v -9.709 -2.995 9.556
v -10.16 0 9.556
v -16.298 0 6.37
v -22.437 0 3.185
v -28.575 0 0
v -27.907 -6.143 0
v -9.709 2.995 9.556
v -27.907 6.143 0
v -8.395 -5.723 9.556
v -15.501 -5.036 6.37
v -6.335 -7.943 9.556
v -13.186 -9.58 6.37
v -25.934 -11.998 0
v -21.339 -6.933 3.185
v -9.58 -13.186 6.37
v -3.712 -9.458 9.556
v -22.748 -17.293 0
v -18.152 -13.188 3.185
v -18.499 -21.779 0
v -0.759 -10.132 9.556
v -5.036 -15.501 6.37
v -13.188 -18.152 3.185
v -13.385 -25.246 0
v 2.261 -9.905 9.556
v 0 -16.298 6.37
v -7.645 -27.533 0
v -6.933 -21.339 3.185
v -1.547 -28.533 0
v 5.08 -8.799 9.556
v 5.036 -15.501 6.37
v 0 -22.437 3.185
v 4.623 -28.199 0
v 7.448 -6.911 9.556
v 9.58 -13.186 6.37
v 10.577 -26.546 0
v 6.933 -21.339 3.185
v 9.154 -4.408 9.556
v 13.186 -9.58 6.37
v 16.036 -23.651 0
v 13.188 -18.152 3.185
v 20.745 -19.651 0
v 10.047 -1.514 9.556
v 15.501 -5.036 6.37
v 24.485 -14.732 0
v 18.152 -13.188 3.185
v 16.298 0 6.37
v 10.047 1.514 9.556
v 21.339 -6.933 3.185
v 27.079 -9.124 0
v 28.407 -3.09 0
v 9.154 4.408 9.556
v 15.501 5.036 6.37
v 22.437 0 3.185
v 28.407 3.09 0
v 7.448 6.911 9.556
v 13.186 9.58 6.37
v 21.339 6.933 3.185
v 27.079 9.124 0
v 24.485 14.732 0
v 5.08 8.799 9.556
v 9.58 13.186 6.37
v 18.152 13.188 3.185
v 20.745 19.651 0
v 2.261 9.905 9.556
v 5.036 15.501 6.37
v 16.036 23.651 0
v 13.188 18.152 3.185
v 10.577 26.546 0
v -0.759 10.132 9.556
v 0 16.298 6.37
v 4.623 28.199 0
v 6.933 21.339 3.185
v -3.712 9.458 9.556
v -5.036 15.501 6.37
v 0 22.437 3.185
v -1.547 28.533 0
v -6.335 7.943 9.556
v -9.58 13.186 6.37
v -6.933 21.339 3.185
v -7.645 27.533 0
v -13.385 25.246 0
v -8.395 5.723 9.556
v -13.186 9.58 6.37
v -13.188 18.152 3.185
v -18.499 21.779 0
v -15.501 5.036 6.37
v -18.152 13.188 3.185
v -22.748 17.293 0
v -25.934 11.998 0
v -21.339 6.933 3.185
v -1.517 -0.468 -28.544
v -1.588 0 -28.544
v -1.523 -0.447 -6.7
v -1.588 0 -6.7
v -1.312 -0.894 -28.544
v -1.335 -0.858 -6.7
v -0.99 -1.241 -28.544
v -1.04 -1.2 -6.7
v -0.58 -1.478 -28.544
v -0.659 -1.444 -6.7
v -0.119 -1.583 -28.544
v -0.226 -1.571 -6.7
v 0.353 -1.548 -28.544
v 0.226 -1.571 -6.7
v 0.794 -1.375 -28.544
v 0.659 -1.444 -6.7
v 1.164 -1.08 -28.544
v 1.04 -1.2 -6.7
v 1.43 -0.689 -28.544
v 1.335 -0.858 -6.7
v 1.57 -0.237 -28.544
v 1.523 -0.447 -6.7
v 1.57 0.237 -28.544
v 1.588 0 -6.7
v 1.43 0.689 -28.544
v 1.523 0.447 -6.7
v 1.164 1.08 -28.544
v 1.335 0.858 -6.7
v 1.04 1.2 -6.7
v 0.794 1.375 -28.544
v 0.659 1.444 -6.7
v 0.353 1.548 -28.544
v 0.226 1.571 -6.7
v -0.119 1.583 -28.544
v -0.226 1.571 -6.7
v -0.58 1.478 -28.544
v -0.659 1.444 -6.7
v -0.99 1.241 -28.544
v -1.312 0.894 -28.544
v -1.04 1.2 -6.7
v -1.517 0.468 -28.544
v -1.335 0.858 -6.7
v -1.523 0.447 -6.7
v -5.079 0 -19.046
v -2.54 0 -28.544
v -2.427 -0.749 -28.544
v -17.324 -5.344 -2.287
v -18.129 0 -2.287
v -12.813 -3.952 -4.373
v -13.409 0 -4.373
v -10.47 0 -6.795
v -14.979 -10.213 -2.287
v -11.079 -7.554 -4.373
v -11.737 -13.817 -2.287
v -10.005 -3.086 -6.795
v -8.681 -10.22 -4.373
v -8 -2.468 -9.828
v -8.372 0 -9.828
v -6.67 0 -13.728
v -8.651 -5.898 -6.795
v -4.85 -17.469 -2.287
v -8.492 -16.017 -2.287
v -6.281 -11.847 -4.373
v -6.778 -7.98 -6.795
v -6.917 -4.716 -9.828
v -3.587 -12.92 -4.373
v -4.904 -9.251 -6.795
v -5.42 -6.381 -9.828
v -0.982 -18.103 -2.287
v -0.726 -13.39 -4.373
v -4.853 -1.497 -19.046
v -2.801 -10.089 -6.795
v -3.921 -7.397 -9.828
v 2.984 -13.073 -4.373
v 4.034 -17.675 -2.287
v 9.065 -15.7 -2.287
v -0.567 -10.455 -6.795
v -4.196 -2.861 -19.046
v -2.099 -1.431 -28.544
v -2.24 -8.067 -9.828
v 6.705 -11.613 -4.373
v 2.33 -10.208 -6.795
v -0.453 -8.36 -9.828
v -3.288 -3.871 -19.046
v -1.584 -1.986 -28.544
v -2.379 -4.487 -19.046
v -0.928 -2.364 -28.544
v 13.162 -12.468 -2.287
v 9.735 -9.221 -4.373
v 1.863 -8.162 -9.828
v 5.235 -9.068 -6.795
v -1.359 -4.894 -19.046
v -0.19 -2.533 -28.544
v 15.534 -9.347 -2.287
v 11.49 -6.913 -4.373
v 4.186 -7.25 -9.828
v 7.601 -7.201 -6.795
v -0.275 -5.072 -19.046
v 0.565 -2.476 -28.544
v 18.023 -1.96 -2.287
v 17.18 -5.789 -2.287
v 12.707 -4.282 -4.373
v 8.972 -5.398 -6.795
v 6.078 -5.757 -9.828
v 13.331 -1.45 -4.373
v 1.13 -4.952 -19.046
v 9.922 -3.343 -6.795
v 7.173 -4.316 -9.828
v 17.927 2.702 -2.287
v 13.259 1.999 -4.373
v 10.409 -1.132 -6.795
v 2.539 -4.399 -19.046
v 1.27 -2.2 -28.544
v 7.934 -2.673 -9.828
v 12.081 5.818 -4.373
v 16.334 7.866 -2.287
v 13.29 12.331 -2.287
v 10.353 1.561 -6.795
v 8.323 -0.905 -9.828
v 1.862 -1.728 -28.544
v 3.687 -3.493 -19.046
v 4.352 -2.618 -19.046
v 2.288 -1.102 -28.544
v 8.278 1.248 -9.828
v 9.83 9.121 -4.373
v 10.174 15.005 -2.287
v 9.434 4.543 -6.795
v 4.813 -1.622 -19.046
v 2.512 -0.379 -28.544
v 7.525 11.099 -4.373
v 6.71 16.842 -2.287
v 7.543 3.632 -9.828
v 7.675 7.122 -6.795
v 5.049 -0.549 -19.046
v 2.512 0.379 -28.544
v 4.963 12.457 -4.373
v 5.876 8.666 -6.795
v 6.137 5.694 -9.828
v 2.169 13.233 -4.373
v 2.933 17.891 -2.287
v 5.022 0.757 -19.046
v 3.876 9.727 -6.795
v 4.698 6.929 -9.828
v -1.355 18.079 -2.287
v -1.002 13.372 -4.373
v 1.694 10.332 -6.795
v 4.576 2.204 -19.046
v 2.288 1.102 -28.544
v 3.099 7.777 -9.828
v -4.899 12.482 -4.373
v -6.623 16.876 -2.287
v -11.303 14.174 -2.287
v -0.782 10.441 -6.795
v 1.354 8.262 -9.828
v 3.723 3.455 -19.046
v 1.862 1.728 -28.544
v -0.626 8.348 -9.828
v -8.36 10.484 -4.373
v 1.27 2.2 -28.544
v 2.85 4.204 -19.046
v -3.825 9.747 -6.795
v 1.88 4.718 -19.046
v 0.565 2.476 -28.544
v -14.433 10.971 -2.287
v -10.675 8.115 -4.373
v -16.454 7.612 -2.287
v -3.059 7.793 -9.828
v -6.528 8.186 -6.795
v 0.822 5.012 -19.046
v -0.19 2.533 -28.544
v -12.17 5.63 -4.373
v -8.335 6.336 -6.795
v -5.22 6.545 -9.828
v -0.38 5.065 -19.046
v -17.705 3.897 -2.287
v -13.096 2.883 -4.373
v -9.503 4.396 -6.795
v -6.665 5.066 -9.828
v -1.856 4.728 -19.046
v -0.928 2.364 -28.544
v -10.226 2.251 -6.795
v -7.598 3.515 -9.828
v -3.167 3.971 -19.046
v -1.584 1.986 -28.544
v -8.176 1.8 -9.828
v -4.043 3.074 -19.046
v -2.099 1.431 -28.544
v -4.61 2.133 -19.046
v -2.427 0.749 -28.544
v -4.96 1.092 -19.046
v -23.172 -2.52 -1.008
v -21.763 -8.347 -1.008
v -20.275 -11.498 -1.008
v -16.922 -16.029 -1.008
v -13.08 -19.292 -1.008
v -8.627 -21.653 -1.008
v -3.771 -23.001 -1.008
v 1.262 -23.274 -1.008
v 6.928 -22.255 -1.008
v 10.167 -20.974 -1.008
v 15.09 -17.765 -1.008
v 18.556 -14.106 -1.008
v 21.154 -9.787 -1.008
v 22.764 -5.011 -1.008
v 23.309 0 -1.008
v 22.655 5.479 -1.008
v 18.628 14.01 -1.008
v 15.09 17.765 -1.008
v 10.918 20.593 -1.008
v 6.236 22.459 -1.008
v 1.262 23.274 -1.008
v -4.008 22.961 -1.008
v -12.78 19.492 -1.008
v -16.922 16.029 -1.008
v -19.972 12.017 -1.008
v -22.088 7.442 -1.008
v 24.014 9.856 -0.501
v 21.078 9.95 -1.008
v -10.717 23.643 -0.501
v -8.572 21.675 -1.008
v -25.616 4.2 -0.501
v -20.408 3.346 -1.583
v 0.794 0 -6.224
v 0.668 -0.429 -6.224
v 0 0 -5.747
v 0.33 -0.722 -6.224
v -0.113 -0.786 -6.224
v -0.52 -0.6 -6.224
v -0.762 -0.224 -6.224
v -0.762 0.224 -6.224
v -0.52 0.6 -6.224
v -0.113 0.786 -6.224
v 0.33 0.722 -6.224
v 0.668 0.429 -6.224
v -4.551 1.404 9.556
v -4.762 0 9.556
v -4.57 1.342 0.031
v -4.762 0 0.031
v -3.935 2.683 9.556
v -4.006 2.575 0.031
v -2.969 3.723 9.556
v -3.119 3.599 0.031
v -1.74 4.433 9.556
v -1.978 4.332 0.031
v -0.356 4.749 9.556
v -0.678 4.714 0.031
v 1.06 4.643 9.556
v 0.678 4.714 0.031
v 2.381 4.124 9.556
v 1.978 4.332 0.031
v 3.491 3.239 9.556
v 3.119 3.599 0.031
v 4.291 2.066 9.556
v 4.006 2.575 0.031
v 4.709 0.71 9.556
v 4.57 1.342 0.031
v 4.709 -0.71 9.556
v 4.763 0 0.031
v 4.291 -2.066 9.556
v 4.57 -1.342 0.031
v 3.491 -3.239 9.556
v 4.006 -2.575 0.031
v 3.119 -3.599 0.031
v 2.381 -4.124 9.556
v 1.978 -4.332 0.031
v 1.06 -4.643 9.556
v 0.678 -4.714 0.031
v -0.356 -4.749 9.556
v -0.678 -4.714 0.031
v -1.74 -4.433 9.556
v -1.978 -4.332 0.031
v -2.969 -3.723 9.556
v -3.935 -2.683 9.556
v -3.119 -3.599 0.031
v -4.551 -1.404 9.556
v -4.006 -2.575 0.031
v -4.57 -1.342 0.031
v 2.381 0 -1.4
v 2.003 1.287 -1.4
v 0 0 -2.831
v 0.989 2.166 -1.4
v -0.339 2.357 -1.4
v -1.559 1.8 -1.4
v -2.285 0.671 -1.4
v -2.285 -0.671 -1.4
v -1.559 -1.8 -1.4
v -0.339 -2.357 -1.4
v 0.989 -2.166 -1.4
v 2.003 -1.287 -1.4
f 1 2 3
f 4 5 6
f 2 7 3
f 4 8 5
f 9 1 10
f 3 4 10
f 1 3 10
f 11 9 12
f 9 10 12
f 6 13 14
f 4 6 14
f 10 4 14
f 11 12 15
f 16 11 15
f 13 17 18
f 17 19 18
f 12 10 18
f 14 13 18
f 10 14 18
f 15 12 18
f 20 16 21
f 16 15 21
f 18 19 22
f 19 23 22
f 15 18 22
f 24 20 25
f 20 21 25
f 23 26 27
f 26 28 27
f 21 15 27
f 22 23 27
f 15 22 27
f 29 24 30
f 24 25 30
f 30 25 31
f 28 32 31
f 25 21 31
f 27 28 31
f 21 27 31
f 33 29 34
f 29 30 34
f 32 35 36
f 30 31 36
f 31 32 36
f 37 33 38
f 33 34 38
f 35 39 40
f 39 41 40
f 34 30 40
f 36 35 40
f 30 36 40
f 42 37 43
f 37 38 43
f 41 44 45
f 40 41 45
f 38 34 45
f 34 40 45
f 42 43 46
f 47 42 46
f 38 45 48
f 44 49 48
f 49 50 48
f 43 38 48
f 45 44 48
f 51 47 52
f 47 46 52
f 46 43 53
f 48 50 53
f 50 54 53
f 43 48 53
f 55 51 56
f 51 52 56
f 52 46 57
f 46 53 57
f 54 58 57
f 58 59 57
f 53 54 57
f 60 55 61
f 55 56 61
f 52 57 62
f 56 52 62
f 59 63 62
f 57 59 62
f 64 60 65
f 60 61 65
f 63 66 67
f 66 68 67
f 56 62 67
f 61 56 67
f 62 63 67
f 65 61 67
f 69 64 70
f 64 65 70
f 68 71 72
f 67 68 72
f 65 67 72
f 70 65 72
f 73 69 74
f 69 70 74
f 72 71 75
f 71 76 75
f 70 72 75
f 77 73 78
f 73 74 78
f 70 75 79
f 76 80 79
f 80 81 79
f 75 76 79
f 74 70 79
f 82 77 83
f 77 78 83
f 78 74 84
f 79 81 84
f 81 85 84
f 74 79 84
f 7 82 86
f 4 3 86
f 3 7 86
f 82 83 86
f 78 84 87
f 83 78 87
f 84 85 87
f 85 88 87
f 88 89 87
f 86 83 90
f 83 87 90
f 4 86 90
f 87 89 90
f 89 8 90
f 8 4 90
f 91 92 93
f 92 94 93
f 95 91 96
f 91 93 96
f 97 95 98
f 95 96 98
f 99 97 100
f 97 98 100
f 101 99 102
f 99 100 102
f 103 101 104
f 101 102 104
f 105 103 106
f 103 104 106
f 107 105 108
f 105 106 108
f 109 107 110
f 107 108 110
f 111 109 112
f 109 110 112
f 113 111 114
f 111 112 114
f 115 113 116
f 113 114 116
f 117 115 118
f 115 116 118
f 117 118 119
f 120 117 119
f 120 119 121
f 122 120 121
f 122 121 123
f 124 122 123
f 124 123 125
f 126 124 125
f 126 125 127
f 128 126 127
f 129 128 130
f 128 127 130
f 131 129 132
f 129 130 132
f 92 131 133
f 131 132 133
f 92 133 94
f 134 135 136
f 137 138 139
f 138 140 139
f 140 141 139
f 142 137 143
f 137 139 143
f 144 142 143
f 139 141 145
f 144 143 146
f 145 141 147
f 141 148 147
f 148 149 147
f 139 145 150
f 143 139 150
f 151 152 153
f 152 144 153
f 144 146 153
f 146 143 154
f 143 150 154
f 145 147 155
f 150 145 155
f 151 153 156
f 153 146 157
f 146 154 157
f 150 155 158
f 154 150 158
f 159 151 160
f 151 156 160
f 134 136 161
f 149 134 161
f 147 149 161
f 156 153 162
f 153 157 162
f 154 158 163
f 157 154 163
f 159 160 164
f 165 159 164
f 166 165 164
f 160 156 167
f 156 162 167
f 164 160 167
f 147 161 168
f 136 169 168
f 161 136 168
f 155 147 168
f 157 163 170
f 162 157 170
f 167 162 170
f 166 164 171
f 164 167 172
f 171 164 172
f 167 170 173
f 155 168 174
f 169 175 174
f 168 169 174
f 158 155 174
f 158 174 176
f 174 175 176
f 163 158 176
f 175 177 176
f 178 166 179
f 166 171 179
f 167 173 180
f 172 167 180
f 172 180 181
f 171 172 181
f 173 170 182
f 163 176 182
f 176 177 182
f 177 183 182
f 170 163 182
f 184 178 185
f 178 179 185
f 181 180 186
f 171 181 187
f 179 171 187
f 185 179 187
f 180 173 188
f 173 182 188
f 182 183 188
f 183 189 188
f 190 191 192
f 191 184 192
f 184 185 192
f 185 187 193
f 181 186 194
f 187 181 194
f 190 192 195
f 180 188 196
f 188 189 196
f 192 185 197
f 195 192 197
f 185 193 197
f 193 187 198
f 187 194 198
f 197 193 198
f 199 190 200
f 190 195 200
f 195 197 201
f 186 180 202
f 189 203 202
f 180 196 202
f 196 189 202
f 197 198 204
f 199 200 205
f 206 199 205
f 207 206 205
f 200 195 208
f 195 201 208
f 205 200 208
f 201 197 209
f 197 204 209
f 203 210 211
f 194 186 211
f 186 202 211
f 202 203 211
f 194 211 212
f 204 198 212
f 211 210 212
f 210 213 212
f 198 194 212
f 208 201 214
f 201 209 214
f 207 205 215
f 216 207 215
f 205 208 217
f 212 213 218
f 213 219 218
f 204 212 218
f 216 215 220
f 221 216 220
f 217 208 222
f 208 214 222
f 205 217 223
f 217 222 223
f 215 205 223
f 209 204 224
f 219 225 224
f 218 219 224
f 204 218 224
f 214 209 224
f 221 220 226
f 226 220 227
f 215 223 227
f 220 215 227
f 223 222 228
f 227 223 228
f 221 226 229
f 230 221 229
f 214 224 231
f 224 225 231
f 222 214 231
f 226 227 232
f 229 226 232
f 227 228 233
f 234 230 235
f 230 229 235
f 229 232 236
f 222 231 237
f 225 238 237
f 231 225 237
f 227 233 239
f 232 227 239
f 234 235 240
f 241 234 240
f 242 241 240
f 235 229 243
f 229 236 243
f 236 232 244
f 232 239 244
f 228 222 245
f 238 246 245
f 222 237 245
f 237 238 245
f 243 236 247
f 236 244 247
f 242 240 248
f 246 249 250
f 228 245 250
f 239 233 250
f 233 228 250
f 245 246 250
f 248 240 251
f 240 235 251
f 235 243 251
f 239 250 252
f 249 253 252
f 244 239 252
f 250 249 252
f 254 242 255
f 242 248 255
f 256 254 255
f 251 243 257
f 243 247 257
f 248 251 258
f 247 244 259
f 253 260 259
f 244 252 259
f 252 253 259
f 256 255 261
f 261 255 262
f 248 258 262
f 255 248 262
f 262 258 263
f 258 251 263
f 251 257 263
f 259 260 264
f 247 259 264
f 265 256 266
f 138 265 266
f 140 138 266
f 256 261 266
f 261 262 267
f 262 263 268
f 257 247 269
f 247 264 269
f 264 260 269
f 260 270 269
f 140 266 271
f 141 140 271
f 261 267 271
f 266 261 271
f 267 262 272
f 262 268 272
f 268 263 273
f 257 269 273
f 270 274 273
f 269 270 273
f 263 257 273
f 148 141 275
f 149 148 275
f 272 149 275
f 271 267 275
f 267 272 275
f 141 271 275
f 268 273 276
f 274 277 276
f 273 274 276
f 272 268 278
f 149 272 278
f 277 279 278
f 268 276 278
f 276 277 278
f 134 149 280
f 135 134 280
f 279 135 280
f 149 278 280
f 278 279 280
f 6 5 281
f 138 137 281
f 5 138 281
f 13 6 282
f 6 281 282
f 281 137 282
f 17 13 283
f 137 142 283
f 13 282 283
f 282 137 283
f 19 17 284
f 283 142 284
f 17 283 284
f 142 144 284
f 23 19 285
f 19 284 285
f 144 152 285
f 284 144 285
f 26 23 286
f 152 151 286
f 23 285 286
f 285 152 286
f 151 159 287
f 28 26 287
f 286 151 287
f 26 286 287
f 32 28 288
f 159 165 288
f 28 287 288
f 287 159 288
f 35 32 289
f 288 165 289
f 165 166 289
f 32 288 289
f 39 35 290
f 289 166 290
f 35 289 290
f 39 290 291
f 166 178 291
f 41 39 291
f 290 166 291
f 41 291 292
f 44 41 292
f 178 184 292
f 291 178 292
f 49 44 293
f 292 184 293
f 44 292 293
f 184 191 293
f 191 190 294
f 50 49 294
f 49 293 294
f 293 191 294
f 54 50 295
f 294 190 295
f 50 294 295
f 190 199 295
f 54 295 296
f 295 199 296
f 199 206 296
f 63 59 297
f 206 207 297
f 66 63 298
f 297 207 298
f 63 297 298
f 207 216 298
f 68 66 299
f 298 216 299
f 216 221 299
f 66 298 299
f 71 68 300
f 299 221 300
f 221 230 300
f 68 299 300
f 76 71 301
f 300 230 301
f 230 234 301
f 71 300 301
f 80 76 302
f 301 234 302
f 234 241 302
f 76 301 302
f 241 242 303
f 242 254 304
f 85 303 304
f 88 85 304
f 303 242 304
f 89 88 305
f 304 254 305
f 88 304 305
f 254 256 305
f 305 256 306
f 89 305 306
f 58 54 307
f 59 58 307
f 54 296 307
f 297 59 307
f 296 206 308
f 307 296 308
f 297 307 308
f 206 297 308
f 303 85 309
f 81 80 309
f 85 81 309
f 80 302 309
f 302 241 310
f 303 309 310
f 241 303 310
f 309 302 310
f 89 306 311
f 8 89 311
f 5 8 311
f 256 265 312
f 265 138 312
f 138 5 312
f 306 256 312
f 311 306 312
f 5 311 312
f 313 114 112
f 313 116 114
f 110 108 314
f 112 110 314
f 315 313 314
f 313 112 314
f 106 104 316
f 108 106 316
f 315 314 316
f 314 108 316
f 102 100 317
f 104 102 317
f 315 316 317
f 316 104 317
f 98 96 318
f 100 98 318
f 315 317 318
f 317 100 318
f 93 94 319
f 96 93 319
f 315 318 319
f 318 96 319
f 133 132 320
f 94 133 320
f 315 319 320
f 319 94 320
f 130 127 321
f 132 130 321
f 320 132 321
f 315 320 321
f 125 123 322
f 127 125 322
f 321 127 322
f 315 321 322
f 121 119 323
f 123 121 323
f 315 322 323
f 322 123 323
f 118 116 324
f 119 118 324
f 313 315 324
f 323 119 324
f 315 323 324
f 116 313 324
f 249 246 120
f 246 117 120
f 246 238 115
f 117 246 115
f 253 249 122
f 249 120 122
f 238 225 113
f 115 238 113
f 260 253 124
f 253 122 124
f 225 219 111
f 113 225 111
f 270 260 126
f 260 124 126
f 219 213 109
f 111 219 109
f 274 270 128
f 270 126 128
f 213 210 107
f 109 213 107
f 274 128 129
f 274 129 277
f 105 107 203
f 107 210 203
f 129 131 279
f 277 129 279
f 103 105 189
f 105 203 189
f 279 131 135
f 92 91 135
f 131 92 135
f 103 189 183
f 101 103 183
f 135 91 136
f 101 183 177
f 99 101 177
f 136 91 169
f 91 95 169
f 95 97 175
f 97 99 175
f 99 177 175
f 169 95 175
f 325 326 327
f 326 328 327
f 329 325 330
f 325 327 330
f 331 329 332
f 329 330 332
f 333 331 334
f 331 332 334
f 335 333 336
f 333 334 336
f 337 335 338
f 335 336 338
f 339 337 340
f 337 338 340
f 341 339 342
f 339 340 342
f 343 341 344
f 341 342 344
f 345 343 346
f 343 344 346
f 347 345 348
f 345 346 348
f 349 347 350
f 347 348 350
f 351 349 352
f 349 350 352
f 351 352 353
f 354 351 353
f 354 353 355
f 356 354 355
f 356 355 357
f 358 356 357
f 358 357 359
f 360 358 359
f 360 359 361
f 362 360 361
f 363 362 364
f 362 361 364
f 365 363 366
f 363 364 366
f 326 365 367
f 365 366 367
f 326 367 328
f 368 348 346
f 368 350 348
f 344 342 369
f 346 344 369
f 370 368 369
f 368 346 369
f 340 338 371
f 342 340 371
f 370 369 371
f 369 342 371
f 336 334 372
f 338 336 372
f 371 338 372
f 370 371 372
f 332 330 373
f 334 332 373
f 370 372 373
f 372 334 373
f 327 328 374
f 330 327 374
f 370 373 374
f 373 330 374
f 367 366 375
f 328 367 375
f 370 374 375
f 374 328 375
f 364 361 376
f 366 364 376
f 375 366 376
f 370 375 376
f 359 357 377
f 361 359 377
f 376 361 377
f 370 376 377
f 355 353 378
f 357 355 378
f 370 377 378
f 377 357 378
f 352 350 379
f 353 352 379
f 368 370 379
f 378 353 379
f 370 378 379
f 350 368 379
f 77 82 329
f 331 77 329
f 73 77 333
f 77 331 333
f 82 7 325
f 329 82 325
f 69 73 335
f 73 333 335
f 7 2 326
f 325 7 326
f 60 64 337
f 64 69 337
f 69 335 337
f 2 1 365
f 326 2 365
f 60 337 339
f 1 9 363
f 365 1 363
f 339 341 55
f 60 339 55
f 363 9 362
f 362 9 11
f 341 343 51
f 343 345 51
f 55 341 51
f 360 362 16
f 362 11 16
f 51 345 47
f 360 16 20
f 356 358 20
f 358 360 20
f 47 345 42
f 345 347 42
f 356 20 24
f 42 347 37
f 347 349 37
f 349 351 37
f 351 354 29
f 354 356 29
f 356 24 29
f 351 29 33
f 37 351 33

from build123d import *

# Parameters (mm, degrees)
F3_D     = 9.525
F3_DEPTH = 9.525
F3_TIP   = 2.8615986981
F5_D     = 3.175
F5_DEPTH = 21.844
F5_TIP   = 0.9538662327


with BuildPart() as f1:
    # F0 (on Front) → F1 (revolve)
    with BuildSketch(Plane.XZ):
        with BuildLine():
            Line((-2.54, -28.544438532), (0, -28.544438532))
            Line((0, -28.544438532), (0, 0))
            Line((0, 0), (-28.575, 0))
            add(Edge.make_bspline(
                [(-28.575, 0), (-22.1033814669, -1.3008907493), (-6.7932074564, -2.9181800603), (-4.8525862527, -21.5668183457), (-2.54, -28.544438532)],
                knots=[0, 0, 0, 0, 0.476190706, 1, 1, 1, 1], degree=3))
        make_face()
        Polygon((-28.575, 0), (0, 0), (0, 9.555561468), (-10.16, 9.555561468), align=None)
    revolve(axis=Axis((0, 0, -9.494438532), (0, 0, 1)))

    # F3
    with Locations(Plane.XY.offset(9.555561468)):
        with Locations((0, 0)):
            Hole(F3_D / 2, depth=F3_DEPTH)
            with Locations((0, 0, -(F3_DEPTH + F3_TIP / 2))):  # 118° drill point
                Cone(0, F3_D / 2, F3_TIP, mode=Mode.SUBTRACT)

    # F5
    with Locations(Plane(origin=(0, 0, -28.544438532), x_dir=(1, 0, 0), z_dir=(0, 0, -1))):
        with Locations((0, 0)):
            Hole(F5_D / 2, depth=F5_DEPTH)
            with Locations((0, 0, -(F5_DEPTH + F5_TIP / 2))):  # 118° drill point
                Cone(0, F5_D / 2, F5_TIP, mode=Mode.SUBTRACT)


solid = f1.part
